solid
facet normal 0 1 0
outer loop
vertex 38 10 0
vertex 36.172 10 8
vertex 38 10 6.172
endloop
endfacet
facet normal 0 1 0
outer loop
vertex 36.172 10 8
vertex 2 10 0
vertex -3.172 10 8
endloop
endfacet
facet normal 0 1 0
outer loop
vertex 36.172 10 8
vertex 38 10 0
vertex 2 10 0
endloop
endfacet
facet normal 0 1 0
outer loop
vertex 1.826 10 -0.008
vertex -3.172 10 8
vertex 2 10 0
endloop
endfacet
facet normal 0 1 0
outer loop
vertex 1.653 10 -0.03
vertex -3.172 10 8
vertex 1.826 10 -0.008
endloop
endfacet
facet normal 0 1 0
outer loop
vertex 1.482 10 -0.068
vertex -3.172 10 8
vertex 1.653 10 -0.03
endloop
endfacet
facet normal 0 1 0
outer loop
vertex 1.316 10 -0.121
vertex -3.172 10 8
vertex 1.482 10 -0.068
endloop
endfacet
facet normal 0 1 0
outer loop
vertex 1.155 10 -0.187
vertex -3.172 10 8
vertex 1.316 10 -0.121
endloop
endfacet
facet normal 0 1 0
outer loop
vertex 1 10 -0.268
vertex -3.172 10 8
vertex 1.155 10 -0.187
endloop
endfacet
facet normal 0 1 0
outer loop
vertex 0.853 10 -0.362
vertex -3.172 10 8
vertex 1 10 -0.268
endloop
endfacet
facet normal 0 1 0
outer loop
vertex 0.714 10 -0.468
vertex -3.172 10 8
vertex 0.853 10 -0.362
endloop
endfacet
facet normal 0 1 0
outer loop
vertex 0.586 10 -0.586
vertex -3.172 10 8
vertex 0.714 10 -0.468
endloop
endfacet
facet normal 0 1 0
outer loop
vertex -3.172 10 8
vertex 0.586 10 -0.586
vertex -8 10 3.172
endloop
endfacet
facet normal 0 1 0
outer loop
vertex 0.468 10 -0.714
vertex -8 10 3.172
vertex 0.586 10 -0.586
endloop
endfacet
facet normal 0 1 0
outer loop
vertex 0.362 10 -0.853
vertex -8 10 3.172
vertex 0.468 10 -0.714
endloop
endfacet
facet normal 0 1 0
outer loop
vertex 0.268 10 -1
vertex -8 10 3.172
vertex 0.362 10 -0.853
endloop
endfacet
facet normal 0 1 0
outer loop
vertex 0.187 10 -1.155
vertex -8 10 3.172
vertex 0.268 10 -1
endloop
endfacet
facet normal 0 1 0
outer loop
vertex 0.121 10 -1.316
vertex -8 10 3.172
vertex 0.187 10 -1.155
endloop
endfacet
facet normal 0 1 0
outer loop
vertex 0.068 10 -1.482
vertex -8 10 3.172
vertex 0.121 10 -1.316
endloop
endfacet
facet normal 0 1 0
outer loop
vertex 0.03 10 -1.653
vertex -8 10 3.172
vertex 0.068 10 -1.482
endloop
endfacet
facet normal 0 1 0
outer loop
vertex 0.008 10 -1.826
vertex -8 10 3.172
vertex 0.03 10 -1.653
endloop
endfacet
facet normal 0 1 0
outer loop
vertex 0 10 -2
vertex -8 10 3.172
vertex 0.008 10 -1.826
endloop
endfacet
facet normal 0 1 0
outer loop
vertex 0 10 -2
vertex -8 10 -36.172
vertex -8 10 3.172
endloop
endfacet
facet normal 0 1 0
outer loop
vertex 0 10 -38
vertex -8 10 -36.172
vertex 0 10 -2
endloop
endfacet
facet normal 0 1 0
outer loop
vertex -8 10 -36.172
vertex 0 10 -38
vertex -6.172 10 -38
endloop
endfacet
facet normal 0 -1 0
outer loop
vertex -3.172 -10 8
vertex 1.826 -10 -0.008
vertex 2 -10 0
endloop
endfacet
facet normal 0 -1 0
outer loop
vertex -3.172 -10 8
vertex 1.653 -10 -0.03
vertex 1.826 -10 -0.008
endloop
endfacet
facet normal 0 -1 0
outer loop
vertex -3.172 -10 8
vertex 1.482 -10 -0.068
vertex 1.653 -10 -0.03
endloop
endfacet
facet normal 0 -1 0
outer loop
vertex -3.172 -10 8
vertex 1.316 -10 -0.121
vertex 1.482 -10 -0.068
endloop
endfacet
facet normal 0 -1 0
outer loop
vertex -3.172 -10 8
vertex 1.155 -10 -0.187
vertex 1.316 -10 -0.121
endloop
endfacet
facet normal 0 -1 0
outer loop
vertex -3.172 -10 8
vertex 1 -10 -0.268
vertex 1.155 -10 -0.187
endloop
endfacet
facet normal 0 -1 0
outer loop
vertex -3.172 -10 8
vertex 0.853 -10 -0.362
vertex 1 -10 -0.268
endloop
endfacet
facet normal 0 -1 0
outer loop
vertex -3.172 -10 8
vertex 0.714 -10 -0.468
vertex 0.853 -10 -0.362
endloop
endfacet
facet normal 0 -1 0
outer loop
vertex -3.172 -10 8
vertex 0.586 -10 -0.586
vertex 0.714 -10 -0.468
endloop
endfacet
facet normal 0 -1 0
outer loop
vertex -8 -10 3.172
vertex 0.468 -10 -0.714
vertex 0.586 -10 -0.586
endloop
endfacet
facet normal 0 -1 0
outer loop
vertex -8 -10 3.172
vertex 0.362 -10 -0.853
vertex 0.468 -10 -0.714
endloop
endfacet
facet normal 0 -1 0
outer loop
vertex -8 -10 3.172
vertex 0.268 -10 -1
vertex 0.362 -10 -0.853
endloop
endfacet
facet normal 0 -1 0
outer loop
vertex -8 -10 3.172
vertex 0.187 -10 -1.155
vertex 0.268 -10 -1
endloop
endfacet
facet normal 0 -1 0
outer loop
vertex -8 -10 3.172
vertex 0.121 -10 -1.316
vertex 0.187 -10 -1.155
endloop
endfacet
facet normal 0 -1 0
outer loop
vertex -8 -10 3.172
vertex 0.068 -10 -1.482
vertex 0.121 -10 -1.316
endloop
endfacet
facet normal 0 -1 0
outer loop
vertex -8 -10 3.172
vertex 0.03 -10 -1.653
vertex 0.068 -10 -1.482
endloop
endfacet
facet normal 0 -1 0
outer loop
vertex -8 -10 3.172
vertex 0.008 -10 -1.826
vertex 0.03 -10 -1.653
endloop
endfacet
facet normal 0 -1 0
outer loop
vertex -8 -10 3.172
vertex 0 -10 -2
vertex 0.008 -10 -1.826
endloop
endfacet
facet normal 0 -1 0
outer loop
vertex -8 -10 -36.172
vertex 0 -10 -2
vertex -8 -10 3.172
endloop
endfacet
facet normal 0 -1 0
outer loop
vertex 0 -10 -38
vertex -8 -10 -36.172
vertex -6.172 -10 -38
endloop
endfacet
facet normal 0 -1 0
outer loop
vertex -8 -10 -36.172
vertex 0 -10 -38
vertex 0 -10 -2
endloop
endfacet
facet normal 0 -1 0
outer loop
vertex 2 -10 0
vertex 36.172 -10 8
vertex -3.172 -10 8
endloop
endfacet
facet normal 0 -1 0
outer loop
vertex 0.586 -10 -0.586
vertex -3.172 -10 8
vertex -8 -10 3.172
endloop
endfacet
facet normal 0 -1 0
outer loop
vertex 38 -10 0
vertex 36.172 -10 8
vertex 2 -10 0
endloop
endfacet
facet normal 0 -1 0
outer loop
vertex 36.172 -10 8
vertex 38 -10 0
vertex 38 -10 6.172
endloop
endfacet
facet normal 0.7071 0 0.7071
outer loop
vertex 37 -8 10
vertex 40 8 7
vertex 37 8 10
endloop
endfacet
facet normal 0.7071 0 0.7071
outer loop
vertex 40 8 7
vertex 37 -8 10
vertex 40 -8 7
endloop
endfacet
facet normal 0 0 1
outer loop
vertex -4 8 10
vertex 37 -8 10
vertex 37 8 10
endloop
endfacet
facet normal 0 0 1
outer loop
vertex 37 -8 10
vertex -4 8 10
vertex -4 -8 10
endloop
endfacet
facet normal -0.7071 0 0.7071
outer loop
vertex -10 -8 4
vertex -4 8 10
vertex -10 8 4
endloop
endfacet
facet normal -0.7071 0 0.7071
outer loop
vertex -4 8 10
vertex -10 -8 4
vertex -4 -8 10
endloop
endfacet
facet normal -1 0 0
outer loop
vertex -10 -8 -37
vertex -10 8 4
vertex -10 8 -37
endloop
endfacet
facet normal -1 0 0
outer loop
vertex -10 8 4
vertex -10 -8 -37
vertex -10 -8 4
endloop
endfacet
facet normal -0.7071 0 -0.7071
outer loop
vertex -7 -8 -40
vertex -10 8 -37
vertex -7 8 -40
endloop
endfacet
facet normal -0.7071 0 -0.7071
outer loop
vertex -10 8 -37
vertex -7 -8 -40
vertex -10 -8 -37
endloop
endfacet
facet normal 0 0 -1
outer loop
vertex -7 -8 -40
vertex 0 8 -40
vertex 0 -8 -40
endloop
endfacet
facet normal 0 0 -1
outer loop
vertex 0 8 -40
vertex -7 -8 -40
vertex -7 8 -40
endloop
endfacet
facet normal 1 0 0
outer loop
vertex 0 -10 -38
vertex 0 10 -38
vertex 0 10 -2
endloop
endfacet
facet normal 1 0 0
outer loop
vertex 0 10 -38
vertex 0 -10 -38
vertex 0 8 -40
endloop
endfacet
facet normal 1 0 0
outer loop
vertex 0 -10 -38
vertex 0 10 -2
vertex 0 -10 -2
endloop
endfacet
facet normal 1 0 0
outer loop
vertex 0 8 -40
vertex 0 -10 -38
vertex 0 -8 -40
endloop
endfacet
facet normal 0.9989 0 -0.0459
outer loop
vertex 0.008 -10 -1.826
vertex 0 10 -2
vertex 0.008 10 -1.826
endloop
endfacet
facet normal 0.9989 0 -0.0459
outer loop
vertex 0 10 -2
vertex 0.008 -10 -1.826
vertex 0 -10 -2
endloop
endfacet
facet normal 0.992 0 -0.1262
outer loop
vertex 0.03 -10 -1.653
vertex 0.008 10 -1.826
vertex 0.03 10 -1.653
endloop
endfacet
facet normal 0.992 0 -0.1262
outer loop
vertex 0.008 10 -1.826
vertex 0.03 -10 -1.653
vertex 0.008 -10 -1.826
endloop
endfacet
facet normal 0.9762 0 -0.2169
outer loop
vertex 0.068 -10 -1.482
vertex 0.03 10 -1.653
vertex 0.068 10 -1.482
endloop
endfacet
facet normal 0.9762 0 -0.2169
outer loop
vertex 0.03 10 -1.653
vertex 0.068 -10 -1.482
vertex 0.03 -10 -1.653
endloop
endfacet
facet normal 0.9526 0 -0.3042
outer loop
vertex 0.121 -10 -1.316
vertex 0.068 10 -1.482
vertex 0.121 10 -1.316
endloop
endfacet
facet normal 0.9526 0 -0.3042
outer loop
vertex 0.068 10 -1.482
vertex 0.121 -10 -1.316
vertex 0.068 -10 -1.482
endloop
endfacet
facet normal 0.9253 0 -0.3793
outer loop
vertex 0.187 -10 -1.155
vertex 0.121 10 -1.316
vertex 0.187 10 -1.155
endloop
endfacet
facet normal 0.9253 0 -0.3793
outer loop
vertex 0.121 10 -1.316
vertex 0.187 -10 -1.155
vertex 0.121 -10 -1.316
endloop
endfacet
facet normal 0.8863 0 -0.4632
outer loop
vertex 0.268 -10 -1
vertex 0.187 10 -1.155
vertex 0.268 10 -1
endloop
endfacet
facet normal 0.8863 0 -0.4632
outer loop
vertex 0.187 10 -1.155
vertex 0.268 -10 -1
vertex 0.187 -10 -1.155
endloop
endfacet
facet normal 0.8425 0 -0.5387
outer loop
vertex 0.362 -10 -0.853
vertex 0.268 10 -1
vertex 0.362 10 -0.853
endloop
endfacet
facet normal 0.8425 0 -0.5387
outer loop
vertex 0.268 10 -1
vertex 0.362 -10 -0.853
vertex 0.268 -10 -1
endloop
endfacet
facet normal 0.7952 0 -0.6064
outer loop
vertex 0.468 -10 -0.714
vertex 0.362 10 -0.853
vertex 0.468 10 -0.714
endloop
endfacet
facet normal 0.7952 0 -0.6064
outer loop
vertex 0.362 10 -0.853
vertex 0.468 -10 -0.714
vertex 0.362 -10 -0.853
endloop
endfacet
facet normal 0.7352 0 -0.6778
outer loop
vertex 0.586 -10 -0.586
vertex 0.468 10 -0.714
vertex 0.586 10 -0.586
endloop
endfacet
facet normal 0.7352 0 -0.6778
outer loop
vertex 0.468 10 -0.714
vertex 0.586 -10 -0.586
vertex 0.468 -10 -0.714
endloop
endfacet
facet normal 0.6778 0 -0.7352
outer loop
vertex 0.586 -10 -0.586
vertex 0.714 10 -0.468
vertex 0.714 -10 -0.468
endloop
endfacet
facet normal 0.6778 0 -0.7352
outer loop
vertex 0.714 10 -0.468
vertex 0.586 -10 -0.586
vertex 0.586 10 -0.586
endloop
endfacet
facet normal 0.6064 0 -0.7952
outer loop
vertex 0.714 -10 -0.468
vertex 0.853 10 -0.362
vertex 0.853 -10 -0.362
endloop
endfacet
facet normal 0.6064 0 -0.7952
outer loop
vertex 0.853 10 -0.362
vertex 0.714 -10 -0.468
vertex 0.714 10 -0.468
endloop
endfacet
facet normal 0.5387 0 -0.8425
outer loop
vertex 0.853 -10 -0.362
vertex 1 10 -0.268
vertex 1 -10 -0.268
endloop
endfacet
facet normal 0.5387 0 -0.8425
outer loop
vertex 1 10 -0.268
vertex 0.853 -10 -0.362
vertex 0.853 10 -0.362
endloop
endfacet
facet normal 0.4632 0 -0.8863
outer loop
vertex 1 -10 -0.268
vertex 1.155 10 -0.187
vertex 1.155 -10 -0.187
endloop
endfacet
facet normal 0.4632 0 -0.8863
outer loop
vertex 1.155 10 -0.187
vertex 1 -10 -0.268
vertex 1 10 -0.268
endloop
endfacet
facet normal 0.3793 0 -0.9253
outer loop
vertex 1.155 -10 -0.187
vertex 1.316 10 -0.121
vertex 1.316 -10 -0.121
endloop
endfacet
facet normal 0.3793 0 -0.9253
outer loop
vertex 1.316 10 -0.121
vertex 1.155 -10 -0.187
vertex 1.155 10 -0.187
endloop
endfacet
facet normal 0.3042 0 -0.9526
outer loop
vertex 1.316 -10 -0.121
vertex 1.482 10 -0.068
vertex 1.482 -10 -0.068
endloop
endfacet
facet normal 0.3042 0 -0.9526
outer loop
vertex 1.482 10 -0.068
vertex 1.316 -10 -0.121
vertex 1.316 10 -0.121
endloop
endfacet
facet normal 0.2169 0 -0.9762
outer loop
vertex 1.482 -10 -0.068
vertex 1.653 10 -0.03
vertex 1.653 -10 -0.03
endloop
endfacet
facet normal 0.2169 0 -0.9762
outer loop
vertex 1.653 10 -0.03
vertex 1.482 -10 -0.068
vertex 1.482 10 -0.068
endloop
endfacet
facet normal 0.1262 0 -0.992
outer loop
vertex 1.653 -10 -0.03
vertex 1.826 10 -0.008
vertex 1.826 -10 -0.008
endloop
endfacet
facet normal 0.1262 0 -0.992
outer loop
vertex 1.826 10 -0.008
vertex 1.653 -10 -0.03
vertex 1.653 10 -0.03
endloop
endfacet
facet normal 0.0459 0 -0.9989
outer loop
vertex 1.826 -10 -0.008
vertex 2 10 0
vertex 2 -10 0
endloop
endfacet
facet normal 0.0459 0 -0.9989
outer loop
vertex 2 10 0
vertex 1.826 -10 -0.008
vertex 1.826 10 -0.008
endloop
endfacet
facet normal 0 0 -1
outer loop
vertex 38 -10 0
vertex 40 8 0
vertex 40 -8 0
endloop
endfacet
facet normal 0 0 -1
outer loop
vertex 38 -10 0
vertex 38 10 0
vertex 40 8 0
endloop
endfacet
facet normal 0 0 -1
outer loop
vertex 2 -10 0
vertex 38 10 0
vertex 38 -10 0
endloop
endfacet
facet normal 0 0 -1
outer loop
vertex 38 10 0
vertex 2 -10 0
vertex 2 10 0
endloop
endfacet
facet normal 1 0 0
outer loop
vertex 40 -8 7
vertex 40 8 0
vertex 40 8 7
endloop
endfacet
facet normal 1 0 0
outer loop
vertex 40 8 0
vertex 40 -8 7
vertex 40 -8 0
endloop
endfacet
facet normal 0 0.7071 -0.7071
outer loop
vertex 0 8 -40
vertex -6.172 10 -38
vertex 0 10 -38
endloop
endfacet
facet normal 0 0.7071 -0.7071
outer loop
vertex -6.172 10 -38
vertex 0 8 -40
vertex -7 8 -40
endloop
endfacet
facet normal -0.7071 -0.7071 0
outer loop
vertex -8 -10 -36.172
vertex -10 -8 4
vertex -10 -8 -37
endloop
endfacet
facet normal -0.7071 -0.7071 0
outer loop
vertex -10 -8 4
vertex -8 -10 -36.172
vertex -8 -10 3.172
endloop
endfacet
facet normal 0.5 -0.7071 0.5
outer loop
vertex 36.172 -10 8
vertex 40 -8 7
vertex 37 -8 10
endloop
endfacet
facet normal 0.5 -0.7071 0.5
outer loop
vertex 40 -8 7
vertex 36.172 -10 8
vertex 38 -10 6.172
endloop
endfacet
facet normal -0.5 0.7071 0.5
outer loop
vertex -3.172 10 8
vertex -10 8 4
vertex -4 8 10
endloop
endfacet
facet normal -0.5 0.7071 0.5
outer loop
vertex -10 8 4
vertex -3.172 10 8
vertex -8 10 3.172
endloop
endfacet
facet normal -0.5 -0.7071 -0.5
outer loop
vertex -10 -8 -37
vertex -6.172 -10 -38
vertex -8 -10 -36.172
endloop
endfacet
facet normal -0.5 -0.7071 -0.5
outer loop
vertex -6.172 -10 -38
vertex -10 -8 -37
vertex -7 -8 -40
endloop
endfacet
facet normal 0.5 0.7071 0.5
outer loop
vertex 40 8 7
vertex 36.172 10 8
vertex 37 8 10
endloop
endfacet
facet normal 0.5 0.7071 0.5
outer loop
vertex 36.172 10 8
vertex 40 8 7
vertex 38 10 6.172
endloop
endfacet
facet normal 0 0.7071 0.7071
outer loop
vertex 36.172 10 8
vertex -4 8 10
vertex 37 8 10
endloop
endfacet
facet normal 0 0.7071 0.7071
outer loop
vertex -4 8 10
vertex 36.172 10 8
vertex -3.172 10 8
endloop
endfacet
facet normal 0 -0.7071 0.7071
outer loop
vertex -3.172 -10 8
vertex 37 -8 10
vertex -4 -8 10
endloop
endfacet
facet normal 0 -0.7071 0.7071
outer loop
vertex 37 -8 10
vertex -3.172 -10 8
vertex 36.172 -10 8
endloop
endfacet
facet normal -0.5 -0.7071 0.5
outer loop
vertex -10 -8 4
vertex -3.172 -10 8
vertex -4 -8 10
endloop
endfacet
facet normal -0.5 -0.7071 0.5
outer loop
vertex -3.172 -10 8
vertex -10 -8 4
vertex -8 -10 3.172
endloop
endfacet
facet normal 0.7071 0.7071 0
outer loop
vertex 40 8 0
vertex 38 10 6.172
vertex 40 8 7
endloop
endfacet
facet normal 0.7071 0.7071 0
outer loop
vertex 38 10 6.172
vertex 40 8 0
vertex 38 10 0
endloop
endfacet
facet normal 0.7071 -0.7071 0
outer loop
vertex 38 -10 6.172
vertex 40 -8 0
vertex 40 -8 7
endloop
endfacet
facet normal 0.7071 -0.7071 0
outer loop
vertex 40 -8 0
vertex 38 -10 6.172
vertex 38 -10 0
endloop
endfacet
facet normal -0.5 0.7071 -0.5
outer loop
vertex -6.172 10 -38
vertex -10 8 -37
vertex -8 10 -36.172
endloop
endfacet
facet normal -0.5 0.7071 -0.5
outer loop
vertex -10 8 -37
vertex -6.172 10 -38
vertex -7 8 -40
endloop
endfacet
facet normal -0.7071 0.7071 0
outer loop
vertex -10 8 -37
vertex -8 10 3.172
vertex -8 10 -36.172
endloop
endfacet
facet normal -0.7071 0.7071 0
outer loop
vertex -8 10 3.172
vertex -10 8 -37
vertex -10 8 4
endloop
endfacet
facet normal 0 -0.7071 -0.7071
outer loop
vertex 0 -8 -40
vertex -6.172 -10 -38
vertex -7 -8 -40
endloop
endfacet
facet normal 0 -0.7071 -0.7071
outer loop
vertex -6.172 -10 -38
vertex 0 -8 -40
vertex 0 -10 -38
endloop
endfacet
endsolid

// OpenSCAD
// Corner Bracket: continuous L elephant-foot construction.
//
// Construction order:
//
//   1. Make ONE continuous L-shaped sheet along the complete inside:
//      horizontal -> inside radius -> vertical.
//   2. Shape that complete sheet with the EXISTING cs hull.
//      This adjusts the sheet at the side/end corners without splitting the L.
//   3. Use that cs-shaped L sheet as the basis for the complete elephant-foot.
//
// This file deliberately stops before the final ef hull until step 2 is
// visually accepted.

/* [Demo] */
scene = "00_cs_body"; // [00_cs_body, 01_raw_L_sheet, 02_cs_hull_inputs, 03_cs_shaped_L, 04_ef_inputs, 05_ef_raw_hull, 06_direct_intersection, 07_ef_relief, 08_final_body]

/* [Geometry] */
armH = 40;
armV = 40;
t = 10;
W = 20;
ce = 6;
c = 3;
cs = 2;
ef = 0.6;
r_in = 2.0;

/* [Hidden] */
$fn = 72;
sheet_thickness = 0.35;

// -----------------------------------------------------------------------------
// Clean bracket geometry, NO ef.
// -----------------------------------------------------------------------------

module inside_corner_2d(r) {
    difference() {
        translate([0, -r]) square([r, r]);
        translate([r, -r]) circle(r = r, $fn = 72);
    }
}

module profile_2d() {
    union() {
        polygon([
            [armH, 0],
            [armH, t - c],
            [armH - c, t],
            [-t + ce, t],
            [-t, t - ce],
            [-t, -armV + c],
            [-t + c, -armV],
            [0, -armV],
            [0, 0]
        ]);

        if (r_in > 0)
            inside_corner_2d(r_in);
    }
}

module outer_shape_2d() {
    polygon([
        [armH, -armV],
        [armH, t - c],
        [armH - c, t],
        [-t + ce, t],
        [-t, t - ce],
        [-t, -armV + c],
        [-t + c, -armV]
    ]);
}

module raw_body() {
    rotate([90, 0, 0])
        linear_extrude(height = W, center = true)
            profile_2d();
}

// -----------------------------------------------------------------------------
// The normal cs hull, exactly the same construction used by the bracket body.
// -----------------------------------------------------------------------------

module cs_input_inner() {
    rotate([90, 0, 0])
        linear_extrude(height = W - 2 * cs, center = true)
            outer_shape_2d();
}

module cs_input_outer() {
    rotate([90, 0, 0])
        linear_extrude(height = W, center = true)
            offset(delta = -cs)
                outer_shape_2d();
}

module cs_hull() {
    hull() {
        cs_input_inner();
        cs_input_outer();
    }
}

module cs_body() {
    intersection() {
        raw_body();
        cs_hull();
    }
}

// -----------------------------------------------------------------------------
// ONE continuous inside L sheet, including r_in.
// -----------------------------------------------------------------------------

module inside_opening_2d() {
    difference() {
        // Open quadrant ends exactly on X=0 and Z=0.
        translate([0, -armV - 5])
            square([armH + 5, armV + 5]);

        if (r_in > 0)
            inside_corner_2d(r_in);
    }
}

module inner_L_band_2d() {
    difference() {
        offset(delta = sheet_thickness)
            inside_opening_2d();

        inside_opening_2d();
    }
}

module clipped_inner_L_band_2d() {
    intersection() {
        inner_L_band_2d();

        translate([-sheet_thickness, -armV])
            square([armH + sheet_thickness, armV + sheet_thickness]);
    }
}

module raw_inner_L_sheet() {
    rotate([90, 0, 0])
        linear_extrude(height = W, center = true)
            clipped_inner_L_band_2d();
}

// Step 2:
// The complete continuous L sheet is shaped by the SAME cs hull as the body.
// This is the first hull operation relevant to the ef construction.
module cs_shaped_inner_L_sheet() {
    intersection() {
        raw_inner_L_sheet();
        cs_hull();
    }
}

// -----------------------------------------------------------------------------
// Elephant-foot step.
//
// Start from the already cs-shaped continuous L.
//
// The second ef input is made from the SAME continuous inside opening, expanded
// by ef.  That moves the complete contact boundary into the bracket while
// preserving the horizontal face, rounded corner and vertical face as one
// continuous profile.
//
// Both inputs are then limited by the existing cs hull, so the side/end corner
// treatment established in step 2 is retained.
// -----------------------------------------------------------------------------

module ef_expanded_L_band_2d() {
    difference() {
        offset(delta = sheet_thickness)
            offset(delta = ef)
                inside_opening_2d();

        offset(delta = ef)
            inside_opening_2d();
    }
}

module clipped_ef_expanded_L_band_2d() {
    intersection() {
        ef_expanded_L_band_2d();

        translate([-ef - sheet_thickness, -armV])
            square([
                armH + ef + sheet_thickness,
                armV + ef + sheet_thickness
            ]);
    }
}

module ef_expanded_L_sheet() {
    intersection() {
        rotate([90, 0, 0])
            linear_extrude(height = W, center = true)
                clipped_ef_expanded_L_band_2d();

        cs_hull();
    }
}


// Beam equivalent of "upper body from ef upward":
// keep the COMPLETE already-cs-chamfered bracket, but remove everything within
// ef of the continuous inside L boundary.
module ef_inner_clearance() {
    rotate([90, 0, 0])
        linear_extrude(height = W + 2, center = true)
            offset(delta = ef)
                inside_opening_2d();
}

module ef_upper_body() {
    difference() {
        cs_body();
        ef_inner_clearance();
    }
}


// Correct beam-equivalent lower input:
// stay on the REAL inner L boundary, but make the sheet smaller in its own
// surface directions. Across Y this means W-2*ef, analogous to inseting the
// beam bottom footprint before hull().
module ef_boundary_L_sheet() {
    intersection() {
        rotate([90, 0, 0])
            linear_extrude(height = W - 2 * ef, center = true)
                clipped_inner_L_band_2d();

        cs_hull();
    }
}


// Beam-equivalent thin input:
// move the complete continuous inner boundary ef INTO the bracket material.
// This gives the hull a real size/position difference, just like the beam's
// offset(-ef) bottom footprint.
module ef_inset_L_band_2d() {
    difference() {
        offset(delta = ef + sheet_thickness)
            inside_opening_2d();

        offset(delta = ef)
            inside_opening_2d();
    }
}

module ef_inset_L_sheet() {
    intersection() {
        rotate([90, 0, 0])
            linear_extrude(height = W, center = true)
                ef_inset_L_band_2d();

        cs_hull();
    }
}

// The raw hull between two complete concave L shapes is convex and would fill
// the open inside corner with a diagonal triangle.
//
// Keep one continuous L construction by restricting that raw hull to the
// corridor swept by the inside boundary from 0 .. ef.  This corridor includes
// the horizontal face, the complete rounded r_in corner and the vertical face.
module ef_corridor_2d() {
    intersection() {
        difference() {
            offset(delta = ef + sheet_thickness)
                inside_opening_2d();

            inside_opening_2d();
        }

        translate([-ef - sheet_thickness, -armV])
            square([
                armH + ef + sheet_thickness,
                armV + ef + sheet_thickness
            ]);
    }
}

module ef_corridor() {
    rotate([90, 0, 0])
        linear_extrude(height = W, center = true)
            ef_corridor_2d();
}

module ef_raw_hull() {
    hull() {
        ef_boundary_L_sheet();
        ef_upper_body();
    }
}

// Final ef transition:
// raw hull, but only inside the continuous rounded-L corridor and the
// previously accepted cs envelope.
module ef_hull() {
    intersection() {
        ef_raw_hull();
        ef_corridor();
        cs_hull();
    }
}

// -----------------------------------------------------------------------------
// Direct beam-style test:
// ignore how ugly the convex raw hull is outside the part and simply keep
// the overlap with the real cs_body.
// -----------------------------------------------------------------------------

module direct_intersection() {
    intersection() {
        cs_body();
        ef_raw_hull();
    }
}

// -----------------------------------------------------------------------------
// Apply the ef relief directly to the existing cs body.
// -----------------------------------------------------------------------------

module final_body() {
    difference() {
        cs_body();
        ef_hull();
    }
}

// -----------------------------------------------------------------------------
// Scenes.
// -----------------------------------------------------------------------------

$vpr = [90, 0, 0];

if (scene == "00_cs_body") {
    color("SteelBlue")
        cs_body();
}

else if (scene == "01_raw_L_sheet") {
    color("DeepSkyBlue", 0.90)
        raw_inner_L_sheet();
}

else if (scene == "02_cs_hull_inputs") {
    color("DeepSkyBlue", 0.75)
        raw_inner_L_sheet();

    color("SteelBlue", 0.18)
        cs_input_inner();

    color("DarkOrange", 0.18)
        cs_input_outer();
}

else if (scene == "03_cs_shaped_L") {
    color("DeepSkyBlue", 0.92)
        cs_shaped_inner_L_sheet();
}

else if (scene == "04_ef_inputs") {
    color("DeepSkyBlue", 0.82)
        ef_boundary_L_sheet();

    color("DarkOrange", 0.28)
        ef_upper_body();
}

else if (scene == "05_ef_raw_hull") {
    color("SeaGreen", 0.88)
        ef_raw_hull();
}

else if (scene == "06_direct_intersection") {
    color("SeaGreen", 0.90)
        direct_intersection();

    color("DarkOrange", 0.12)
        cs_body();
}

else if (scene == "07_ef_relief") {
    color("SeaGreen", 0.90)
        ef_hull();

    color("DarkOrange", 0.15)
        cs_body();
}

else {
    color("SteelBlue")
        final_body();
}
